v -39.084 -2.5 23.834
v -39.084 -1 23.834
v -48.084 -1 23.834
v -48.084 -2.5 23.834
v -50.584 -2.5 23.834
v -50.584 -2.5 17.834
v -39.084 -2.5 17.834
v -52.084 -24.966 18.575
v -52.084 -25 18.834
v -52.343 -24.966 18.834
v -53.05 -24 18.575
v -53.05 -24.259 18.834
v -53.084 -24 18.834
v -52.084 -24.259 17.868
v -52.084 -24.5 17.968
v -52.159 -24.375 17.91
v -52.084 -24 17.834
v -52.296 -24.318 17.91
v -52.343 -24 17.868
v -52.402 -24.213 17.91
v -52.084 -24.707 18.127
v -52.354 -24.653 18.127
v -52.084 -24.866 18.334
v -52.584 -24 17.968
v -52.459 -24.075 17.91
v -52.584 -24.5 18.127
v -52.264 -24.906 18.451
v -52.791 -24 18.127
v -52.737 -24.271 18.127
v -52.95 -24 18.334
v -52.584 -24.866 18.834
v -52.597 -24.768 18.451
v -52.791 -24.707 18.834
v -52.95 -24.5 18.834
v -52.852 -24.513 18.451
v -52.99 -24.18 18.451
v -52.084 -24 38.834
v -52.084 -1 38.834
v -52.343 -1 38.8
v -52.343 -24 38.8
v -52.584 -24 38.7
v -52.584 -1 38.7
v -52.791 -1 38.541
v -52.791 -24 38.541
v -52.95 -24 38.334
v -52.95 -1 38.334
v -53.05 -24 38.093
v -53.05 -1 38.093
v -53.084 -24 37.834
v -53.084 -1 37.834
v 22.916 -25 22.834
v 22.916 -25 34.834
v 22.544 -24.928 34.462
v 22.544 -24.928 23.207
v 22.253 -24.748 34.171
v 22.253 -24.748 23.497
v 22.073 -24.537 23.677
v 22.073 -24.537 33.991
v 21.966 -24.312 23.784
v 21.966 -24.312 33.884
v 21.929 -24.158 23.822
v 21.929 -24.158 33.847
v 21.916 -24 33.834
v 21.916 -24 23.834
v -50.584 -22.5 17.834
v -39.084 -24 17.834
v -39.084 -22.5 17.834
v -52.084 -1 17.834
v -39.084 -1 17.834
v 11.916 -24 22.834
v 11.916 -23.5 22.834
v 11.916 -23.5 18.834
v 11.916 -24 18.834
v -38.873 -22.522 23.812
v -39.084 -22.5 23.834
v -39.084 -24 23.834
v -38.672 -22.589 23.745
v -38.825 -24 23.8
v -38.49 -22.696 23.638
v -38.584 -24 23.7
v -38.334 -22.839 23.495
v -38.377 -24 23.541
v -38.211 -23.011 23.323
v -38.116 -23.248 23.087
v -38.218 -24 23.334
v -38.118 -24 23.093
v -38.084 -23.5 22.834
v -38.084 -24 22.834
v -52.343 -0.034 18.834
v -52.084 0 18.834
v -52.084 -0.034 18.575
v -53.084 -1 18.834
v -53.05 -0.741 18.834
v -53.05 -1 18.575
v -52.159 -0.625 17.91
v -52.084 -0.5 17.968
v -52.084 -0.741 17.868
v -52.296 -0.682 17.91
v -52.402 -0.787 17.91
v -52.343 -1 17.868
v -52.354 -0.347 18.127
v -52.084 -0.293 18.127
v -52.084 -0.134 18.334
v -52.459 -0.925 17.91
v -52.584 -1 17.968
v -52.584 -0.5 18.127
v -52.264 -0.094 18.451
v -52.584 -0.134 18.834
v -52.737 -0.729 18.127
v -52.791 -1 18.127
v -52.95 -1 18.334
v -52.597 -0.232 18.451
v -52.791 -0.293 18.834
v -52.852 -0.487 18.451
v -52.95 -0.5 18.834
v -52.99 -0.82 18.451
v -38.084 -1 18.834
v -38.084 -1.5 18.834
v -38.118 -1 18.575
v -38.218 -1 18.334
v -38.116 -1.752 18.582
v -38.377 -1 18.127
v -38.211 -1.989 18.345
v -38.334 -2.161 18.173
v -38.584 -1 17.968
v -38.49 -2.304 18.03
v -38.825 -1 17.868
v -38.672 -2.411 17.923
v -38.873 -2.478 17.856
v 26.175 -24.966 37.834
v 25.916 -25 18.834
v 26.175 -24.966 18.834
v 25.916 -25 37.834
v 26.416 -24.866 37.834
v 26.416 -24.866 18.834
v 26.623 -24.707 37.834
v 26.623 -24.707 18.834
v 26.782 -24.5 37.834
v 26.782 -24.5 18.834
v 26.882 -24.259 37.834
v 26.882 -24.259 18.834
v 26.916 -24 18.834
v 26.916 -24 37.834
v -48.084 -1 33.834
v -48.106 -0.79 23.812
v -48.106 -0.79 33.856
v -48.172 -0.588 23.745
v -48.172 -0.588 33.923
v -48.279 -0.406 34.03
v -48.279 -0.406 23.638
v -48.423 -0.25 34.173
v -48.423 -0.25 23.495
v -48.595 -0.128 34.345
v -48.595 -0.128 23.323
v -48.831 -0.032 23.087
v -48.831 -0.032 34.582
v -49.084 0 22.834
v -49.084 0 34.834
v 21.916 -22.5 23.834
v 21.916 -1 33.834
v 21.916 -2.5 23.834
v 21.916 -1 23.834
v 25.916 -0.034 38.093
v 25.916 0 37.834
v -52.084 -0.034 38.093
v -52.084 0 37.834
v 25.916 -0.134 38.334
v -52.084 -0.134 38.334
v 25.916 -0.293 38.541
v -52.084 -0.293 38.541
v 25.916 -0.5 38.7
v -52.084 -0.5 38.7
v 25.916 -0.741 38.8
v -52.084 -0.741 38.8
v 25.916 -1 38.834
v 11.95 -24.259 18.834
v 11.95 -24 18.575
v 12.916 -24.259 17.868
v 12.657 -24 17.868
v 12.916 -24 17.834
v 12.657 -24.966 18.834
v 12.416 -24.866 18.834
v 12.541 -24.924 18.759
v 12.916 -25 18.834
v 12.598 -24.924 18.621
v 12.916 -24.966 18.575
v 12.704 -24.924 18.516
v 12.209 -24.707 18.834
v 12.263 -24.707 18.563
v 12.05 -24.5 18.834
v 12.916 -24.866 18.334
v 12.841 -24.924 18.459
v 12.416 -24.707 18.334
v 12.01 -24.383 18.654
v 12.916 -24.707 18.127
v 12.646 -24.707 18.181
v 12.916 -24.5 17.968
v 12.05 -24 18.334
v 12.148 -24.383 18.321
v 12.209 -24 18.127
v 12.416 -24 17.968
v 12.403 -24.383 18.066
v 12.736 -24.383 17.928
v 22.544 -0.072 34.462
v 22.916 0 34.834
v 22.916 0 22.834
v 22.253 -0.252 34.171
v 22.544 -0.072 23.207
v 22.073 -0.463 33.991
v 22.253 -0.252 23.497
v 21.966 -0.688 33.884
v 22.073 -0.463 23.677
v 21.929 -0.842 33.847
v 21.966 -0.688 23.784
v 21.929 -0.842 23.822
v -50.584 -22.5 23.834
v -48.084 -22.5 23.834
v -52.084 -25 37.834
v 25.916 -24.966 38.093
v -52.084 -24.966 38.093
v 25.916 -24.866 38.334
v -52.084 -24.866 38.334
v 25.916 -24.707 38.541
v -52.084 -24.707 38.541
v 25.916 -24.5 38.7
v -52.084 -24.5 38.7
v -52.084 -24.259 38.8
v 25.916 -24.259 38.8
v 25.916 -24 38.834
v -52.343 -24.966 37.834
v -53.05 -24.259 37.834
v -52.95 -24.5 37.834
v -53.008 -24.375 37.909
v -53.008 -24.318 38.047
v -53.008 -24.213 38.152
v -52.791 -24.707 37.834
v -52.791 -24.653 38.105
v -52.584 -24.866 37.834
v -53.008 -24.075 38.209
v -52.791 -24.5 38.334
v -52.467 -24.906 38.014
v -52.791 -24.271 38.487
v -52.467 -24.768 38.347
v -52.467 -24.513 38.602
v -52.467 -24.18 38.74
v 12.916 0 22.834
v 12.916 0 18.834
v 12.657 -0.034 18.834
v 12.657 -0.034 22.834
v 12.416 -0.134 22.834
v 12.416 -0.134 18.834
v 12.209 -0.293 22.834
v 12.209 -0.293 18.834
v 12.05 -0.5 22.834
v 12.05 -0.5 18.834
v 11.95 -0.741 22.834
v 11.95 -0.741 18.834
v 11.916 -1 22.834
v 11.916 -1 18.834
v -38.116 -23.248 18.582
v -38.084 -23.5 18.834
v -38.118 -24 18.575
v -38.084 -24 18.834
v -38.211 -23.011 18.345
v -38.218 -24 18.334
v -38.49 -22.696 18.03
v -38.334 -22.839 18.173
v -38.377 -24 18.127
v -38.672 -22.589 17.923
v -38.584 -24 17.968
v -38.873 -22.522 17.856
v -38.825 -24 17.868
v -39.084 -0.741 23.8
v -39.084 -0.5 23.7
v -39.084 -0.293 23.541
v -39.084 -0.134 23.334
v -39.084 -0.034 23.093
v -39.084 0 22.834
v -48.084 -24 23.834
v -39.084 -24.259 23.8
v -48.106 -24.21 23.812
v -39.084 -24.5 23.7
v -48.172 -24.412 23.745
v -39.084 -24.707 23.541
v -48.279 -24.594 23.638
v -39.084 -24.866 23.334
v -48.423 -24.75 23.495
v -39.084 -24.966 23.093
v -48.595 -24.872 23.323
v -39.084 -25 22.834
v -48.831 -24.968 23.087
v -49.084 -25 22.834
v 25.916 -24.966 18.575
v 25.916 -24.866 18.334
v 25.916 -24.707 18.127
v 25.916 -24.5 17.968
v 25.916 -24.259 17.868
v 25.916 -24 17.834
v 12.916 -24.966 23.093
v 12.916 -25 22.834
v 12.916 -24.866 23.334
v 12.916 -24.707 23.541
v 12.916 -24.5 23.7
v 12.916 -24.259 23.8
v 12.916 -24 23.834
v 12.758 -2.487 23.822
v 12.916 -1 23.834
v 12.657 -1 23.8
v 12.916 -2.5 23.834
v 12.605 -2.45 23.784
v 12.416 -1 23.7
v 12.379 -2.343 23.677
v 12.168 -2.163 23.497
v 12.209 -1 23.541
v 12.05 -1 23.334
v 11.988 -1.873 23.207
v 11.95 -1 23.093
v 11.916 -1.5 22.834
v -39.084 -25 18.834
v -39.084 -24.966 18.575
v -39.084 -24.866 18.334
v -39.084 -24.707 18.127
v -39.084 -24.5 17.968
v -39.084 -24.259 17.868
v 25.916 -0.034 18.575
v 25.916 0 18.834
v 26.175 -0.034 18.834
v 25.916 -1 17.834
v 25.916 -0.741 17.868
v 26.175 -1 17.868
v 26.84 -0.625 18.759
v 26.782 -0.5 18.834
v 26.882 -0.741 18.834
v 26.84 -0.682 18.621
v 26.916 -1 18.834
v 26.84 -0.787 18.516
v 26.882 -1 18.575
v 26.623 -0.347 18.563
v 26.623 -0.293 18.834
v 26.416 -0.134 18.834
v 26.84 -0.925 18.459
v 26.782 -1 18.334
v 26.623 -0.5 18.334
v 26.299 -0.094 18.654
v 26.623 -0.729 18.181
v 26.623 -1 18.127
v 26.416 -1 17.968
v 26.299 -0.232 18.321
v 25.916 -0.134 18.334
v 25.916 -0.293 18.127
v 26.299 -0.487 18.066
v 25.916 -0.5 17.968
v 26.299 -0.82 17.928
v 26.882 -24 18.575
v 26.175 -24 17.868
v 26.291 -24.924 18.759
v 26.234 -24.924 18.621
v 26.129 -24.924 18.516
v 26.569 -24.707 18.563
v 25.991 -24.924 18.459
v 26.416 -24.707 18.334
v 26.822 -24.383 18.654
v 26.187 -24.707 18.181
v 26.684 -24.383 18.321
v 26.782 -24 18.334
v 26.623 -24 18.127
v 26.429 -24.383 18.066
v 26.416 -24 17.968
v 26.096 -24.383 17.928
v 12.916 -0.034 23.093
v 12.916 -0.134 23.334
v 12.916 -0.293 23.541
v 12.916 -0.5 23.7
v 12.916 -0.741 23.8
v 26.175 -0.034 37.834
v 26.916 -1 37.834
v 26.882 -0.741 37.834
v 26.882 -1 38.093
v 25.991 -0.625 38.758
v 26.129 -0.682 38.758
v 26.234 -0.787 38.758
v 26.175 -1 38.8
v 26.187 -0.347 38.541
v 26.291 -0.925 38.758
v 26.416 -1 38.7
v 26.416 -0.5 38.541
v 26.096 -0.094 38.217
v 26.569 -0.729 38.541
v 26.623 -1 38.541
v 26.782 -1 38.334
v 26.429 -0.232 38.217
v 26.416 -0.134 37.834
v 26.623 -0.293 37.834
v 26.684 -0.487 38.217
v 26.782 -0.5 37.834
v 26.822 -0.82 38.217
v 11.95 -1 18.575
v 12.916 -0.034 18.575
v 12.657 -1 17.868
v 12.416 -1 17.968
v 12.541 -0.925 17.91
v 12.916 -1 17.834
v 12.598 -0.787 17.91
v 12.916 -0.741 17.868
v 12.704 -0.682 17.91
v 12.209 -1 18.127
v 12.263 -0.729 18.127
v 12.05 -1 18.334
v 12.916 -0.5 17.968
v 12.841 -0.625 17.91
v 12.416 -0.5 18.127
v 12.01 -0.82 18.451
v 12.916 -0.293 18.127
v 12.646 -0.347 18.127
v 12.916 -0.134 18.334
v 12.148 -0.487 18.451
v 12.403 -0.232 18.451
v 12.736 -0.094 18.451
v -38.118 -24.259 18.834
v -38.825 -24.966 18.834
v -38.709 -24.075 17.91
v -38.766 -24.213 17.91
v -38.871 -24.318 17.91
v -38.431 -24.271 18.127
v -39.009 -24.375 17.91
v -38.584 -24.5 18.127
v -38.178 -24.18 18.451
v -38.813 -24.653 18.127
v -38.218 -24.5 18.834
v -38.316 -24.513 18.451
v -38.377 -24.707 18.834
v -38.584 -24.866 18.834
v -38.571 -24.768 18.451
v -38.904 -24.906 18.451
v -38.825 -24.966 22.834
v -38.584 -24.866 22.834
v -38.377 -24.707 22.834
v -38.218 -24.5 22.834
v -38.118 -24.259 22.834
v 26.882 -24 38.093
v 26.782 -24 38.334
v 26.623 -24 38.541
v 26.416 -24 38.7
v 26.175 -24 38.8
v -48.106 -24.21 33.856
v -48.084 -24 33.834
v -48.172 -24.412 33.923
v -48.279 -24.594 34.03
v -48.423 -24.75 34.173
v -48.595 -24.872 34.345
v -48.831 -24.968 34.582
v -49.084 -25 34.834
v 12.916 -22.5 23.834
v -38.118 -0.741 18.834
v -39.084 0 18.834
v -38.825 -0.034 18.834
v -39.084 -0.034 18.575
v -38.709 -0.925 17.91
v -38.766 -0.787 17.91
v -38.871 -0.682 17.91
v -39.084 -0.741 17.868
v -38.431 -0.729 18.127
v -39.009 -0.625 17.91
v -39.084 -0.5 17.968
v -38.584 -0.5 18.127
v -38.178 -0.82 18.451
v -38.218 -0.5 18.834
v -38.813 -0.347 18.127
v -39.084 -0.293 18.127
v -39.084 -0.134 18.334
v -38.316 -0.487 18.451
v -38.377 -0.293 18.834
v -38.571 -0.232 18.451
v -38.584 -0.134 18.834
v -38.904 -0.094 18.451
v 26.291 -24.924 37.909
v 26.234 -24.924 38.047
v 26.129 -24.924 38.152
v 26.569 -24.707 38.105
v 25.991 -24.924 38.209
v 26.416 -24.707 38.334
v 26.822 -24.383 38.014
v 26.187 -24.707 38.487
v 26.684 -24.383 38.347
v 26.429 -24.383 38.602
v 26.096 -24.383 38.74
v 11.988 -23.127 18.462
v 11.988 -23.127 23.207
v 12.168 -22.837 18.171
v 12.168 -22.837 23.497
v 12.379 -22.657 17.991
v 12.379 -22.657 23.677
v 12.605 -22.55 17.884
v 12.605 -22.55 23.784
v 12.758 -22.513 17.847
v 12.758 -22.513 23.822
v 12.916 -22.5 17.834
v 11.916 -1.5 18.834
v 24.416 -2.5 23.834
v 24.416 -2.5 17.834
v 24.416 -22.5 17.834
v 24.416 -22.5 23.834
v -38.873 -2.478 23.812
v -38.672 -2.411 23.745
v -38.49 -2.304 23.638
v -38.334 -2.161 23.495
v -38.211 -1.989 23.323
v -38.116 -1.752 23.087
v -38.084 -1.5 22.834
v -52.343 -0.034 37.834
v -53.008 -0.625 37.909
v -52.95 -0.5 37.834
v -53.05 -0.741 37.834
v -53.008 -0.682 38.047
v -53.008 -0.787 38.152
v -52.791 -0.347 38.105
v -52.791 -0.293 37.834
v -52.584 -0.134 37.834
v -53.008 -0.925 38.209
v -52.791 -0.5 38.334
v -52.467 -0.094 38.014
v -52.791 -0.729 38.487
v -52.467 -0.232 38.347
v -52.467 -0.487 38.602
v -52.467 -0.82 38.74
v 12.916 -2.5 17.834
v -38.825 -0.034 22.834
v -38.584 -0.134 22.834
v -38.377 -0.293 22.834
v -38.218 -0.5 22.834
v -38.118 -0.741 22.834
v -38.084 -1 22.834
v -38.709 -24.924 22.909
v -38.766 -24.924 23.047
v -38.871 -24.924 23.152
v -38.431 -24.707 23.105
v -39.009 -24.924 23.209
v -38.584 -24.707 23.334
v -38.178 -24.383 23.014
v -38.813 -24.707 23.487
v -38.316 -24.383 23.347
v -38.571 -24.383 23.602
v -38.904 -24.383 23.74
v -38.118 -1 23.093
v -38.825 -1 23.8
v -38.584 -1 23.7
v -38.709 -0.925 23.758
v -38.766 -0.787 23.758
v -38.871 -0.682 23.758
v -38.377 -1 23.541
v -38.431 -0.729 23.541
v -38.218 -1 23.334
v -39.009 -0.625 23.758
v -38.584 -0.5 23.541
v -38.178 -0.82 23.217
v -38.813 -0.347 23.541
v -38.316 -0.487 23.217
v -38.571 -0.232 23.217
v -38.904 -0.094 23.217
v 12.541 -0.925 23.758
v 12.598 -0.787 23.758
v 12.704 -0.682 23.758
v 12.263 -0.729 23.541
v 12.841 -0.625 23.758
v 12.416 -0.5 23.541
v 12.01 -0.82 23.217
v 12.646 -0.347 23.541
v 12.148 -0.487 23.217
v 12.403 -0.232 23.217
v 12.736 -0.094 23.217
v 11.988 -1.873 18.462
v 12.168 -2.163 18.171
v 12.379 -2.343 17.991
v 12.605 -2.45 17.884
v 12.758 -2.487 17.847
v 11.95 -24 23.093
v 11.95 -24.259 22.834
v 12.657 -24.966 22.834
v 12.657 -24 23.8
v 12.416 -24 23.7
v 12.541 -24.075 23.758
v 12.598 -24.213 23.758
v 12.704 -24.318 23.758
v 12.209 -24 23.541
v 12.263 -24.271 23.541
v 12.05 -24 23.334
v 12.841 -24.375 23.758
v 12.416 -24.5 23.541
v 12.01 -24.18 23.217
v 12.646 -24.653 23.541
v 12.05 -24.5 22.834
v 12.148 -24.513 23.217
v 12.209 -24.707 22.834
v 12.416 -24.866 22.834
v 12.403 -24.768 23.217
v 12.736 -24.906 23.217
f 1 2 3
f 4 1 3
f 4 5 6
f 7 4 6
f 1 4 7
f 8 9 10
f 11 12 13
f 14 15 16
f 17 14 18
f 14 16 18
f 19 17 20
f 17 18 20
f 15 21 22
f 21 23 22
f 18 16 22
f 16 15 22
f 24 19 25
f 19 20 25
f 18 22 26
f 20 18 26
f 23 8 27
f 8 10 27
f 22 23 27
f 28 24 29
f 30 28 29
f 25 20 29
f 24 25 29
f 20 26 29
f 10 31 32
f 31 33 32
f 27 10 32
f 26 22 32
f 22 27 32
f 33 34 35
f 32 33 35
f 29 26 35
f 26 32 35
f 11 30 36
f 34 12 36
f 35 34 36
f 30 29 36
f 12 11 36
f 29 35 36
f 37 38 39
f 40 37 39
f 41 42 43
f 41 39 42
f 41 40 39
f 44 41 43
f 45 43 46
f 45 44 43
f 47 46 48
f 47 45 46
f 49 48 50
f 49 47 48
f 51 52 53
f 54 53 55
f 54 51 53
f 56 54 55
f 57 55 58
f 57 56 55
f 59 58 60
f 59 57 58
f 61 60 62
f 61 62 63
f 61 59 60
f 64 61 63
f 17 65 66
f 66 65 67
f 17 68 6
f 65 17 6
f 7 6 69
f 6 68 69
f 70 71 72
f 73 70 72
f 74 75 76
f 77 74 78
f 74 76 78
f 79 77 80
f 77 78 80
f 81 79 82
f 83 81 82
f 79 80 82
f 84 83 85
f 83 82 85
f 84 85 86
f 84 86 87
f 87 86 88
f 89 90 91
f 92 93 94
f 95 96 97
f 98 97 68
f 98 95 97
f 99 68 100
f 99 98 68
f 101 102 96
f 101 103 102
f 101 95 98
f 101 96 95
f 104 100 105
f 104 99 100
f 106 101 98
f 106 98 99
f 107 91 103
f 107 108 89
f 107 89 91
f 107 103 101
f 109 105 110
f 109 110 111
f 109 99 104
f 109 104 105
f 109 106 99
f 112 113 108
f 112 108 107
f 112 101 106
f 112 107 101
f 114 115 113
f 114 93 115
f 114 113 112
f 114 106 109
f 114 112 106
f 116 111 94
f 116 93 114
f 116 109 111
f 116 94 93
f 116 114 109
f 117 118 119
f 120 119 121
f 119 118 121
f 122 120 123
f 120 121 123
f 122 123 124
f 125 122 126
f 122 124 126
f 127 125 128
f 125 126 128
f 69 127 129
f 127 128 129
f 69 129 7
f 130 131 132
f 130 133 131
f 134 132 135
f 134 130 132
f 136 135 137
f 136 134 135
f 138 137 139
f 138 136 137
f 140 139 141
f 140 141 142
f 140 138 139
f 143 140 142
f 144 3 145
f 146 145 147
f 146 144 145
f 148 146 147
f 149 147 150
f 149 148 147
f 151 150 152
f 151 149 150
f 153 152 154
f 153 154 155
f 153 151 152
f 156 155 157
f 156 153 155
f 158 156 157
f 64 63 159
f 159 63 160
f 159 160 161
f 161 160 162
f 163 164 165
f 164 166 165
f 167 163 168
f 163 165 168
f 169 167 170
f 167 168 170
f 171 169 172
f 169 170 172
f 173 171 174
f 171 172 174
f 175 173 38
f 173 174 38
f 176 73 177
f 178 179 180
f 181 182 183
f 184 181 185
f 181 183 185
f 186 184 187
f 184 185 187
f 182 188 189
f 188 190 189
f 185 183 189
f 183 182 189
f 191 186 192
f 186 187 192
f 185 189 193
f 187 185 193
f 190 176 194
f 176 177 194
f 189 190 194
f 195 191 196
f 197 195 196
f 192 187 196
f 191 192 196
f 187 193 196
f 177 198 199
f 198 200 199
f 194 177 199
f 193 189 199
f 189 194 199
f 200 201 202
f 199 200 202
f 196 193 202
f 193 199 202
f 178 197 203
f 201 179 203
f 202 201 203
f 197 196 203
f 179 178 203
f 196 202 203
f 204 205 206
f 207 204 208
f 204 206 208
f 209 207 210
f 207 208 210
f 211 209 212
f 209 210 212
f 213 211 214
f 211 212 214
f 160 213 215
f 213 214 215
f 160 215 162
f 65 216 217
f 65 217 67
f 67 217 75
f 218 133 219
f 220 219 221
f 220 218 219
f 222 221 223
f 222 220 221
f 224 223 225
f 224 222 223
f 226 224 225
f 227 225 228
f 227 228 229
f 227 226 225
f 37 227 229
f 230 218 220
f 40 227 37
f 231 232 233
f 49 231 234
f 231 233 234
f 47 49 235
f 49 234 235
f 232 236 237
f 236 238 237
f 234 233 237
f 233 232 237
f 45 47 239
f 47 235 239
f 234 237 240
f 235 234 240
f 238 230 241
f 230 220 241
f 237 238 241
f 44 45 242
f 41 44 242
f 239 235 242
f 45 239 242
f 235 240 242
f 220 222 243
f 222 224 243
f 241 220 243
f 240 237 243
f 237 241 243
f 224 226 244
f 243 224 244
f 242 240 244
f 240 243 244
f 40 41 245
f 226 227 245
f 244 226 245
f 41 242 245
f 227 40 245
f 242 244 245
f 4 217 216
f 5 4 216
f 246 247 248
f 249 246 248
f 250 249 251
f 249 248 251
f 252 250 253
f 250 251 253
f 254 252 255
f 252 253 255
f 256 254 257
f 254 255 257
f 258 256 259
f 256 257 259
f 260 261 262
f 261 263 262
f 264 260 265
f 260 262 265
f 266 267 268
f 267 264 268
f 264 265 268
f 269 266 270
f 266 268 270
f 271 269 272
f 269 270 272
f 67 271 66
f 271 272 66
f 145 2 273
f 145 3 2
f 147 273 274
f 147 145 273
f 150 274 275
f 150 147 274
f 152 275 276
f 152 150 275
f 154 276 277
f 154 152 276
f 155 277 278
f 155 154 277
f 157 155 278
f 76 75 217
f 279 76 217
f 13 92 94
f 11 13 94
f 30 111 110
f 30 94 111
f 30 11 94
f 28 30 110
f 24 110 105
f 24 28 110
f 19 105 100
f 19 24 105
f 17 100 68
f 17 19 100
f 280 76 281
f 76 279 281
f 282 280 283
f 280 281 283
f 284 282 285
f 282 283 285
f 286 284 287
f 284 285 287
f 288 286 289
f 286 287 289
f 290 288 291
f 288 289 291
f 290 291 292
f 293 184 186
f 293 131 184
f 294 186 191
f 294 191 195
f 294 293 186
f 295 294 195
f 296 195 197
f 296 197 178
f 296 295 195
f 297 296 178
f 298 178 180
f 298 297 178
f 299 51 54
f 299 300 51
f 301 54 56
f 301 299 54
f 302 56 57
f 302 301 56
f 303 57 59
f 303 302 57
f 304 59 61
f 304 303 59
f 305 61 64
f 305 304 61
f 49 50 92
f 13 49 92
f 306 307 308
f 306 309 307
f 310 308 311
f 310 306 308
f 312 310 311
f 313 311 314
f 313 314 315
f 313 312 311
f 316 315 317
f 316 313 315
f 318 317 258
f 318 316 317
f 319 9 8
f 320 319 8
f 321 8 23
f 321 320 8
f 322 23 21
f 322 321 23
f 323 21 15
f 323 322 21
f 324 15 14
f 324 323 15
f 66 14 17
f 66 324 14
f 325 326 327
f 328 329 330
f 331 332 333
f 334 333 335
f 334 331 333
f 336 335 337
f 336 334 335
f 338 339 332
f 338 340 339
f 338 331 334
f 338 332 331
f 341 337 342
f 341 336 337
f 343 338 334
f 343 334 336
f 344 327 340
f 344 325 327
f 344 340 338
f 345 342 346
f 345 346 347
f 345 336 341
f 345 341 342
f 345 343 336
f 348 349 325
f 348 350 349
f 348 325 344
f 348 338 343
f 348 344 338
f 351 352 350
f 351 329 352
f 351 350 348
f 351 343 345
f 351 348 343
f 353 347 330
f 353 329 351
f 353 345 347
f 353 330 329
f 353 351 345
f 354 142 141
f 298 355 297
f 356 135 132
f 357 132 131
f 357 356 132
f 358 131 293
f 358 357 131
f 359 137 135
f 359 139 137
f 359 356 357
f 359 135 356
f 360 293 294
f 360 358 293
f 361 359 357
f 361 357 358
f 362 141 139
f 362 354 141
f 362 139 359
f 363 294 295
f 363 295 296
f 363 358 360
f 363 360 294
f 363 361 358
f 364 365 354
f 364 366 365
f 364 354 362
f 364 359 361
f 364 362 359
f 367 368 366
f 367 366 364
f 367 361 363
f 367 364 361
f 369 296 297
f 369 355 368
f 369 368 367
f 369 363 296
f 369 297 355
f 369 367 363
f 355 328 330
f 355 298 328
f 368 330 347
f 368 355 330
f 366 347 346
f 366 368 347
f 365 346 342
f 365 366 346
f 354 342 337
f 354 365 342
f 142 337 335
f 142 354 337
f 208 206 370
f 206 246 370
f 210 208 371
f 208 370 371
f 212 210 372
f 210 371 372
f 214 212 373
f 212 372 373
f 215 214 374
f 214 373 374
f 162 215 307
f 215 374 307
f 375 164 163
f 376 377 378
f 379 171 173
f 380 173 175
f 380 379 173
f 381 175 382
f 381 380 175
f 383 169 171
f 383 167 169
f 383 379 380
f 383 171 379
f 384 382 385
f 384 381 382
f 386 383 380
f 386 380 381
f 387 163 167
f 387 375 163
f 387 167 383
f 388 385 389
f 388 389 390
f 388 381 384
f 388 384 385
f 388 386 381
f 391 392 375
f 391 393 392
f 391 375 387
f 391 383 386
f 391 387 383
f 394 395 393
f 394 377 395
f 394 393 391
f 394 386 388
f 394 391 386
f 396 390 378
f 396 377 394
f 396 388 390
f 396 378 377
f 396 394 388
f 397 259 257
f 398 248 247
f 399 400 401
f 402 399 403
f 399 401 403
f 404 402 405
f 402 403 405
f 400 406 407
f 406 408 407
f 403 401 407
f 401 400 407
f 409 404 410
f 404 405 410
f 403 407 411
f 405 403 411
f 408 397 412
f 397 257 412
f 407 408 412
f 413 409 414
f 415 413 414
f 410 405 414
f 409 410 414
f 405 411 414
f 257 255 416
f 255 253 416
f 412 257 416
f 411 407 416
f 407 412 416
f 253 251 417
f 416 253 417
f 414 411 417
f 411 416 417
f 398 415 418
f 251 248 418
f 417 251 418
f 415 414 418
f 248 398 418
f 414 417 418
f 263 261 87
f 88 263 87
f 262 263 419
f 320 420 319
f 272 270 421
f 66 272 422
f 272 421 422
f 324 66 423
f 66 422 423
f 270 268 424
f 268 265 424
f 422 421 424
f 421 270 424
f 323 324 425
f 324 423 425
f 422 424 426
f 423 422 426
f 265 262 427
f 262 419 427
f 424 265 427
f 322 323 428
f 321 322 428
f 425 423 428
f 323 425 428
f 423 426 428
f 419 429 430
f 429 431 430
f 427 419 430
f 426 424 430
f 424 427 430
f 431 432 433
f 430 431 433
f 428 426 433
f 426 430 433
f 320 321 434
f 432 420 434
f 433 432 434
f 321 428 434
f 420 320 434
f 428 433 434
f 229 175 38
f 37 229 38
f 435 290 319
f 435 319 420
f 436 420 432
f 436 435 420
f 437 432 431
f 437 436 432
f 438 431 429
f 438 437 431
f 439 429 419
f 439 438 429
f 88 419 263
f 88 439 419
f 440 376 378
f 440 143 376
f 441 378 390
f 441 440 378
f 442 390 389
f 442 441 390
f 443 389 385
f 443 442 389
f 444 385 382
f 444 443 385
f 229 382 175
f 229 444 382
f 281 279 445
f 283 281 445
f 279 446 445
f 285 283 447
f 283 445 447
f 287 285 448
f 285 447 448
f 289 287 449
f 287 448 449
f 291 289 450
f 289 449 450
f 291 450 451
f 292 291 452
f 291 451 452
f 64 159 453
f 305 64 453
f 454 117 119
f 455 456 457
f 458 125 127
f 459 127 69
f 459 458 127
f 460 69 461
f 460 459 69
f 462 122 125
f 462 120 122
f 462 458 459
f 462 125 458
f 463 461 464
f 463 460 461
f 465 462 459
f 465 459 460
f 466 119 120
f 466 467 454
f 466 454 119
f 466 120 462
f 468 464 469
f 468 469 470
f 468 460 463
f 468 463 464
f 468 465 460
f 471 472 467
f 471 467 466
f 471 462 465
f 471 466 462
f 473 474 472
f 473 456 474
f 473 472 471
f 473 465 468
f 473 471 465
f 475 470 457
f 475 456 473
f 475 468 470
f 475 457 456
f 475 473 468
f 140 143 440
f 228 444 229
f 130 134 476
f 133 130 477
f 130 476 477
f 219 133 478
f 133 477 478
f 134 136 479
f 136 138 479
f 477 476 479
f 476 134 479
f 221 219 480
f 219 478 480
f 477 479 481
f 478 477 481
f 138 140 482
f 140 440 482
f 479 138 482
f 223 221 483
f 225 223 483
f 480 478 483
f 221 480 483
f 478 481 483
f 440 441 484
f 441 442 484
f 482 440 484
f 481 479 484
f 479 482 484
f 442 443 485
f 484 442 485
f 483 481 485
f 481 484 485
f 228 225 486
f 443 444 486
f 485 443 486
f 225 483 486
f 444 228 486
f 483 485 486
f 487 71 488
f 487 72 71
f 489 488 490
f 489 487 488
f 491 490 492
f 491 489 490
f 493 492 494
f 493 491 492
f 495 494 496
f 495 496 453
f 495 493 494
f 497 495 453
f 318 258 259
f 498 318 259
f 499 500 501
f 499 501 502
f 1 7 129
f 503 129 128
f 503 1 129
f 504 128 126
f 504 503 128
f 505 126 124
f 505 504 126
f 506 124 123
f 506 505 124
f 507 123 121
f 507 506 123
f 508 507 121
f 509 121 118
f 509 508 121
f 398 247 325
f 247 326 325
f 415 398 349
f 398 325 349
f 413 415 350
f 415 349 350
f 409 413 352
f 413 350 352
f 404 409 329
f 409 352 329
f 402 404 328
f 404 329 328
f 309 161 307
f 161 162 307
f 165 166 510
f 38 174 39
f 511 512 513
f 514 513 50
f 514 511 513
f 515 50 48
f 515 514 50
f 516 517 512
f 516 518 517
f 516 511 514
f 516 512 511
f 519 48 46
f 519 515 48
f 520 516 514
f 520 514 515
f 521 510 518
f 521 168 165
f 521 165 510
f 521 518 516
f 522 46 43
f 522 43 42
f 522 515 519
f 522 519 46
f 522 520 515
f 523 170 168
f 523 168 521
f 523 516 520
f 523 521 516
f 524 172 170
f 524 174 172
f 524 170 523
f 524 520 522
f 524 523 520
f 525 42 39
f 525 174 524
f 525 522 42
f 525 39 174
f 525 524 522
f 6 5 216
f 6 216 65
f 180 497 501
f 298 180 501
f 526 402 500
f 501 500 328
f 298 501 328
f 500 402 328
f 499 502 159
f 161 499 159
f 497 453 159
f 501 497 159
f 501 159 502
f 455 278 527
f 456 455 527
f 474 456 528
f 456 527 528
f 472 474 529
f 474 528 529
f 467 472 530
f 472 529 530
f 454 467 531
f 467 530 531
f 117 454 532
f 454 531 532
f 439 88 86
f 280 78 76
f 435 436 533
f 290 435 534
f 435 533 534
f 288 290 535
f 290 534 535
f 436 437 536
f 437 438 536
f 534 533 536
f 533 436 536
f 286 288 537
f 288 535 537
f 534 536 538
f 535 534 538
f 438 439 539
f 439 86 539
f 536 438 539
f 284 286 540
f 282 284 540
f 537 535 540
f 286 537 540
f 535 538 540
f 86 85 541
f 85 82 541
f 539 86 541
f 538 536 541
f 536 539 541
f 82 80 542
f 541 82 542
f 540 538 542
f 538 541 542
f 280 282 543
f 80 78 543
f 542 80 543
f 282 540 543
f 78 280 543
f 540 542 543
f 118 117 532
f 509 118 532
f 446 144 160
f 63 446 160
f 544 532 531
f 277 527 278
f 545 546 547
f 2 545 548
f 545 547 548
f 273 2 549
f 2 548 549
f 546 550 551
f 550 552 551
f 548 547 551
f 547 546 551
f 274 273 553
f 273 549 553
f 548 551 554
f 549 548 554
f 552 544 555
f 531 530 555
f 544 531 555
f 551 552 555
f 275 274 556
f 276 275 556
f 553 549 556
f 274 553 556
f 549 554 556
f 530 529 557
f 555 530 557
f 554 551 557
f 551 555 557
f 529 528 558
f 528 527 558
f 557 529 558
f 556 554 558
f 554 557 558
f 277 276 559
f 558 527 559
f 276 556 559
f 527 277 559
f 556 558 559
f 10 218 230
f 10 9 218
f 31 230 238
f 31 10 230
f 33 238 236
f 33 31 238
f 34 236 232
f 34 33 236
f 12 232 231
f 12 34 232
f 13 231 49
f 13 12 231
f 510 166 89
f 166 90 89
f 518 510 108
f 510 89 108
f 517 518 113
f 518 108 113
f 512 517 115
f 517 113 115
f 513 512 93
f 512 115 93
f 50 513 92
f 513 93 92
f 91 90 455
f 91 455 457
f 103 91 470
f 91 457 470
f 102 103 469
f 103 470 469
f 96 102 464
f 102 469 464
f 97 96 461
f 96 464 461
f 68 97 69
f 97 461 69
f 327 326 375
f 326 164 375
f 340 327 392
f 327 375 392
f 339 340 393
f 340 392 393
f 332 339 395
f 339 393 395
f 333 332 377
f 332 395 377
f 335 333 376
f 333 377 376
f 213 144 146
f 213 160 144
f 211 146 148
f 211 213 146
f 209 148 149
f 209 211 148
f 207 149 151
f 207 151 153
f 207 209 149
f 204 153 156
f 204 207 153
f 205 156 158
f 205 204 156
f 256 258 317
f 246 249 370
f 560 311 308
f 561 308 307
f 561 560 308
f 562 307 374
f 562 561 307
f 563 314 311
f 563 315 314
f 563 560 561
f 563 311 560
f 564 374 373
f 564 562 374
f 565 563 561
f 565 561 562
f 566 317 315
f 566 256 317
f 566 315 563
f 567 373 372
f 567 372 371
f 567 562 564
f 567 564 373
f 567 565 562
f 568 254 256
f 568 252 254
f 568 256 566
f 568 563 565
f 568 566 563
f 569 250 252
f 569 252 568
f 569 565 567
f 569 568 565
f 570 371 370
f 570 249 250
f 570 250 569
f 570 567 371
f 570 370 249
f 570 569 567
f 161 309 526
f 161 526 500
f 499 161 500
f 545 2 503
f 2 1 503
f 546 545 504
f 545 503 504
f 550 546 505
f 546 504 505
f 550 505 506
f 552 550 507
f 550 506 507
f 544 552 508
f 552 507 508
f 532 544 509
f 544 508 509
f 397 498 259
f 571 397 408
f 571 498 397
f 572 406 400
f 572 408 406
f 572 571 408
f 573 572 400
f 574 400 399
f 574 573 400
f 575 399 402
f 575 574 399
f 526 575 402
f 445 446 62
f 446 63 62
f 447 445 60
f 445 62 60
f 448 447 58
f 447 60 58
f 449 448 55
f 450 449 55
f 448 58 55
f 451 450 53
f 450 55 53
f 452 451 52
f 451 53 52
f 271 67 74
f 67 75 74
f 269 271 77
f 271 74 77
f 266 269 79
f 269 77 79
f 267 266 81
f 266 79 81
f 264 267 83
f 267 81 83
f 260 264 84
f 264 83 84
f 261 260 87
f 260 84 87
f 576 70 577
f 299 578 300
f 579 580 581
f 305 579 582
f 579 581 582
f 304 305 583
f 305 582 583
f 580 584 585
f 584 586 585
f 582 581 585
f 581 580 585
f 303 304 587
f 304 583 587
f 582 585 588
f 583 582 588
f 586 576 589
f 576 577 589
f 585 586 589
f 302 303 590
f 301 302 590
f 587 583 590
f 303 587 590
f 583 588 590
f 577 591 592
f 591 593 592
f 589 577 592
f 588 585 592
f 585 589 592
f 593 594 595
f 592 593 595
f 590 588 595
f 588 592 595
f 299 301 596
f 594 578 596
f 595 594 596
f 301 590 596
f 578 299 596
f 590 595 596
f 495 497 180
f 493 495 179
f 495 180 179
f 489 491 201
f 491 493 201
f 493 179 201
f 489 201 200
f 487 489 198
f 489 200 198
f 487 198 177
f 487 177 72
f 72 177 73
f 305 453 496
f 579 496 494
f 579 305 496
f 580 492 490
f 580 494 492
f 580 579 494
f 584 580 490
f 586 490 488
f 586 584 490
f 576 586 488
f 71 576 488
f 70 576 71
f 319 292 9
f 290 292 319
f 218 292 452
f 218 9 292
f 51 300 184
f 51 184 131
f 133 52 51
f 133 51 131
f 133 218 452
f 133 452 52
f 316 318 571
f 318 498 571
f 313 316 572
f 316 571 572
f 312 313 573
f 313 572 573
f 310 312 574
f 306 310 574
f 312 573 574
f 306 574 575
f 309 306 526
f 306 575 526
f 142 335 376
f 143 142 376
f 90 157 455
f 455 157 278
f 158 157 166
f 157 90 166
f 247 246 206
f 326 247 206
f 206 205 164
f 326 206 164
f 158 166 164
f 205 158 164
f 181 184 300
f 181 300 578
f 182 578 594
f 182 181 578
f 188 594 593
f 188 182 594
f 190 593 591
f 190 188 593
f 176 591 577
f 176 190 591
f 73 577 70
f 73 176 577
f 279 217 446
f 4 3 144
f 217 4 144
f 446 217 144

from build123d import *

# Parameters (mm, degrees)
F1_DEPTH    = 25
F2_T        = 2.5
F2_T3_DEPTH = 30
F3_R        = 1


# Not quite as in the source:
# - a shell that OpenCascade refuses in one call is made with other operations: the cavity is built on its own and cut out


with BuildPart() as f1:
    # F0 (on Front) → F1 (new body)
    with BuildSketch(Plane.XZ):
        Polygon((-48.0838582665, 23.83404883), (-48.0838582665, 33.83404883), (21.9161417335, 33.83404883), (21.9161417335, 23.83404883), (11.9161417335, 23.83404883), (11.9161417335, 17.83404883), (21.9161417335, 17.83404883), (26.9161417335, 17.83404883), (26.9161417335, 38.83404883), (-53.0838582665, 38.83404883), (-53.0838582665, 17.83404883), (-48.0838582665, 17.83404883), (-38.0838582665, 17.83404883), (-38.0838582665, 23.83404883), align=None)
    extrude(amount=F1_DEPTH)

    # F2: shell of thickness 2.5, made by hand


with BuildPart() as f2_core1:
    # F2_t2: copy of F1
    add(f1.part)

    # the walls: a layer under each face that stays
    f2_faces = [f2_core1.faces().sort_by_distance(p)[0] for p in [
        (21.9161417335, -12.5, 28.83404883),
        (-39.7505249331, -25, 21.33404883),
        (-48.0838582665, -12.5, 28.83404883),
        (-53.0838582665, -12.5, 28.33404883),
        (-13.0838582665, -12.5, 38.83404883),
        (26.9161417335, -12.5, 28.33404883),
        (-39.7505249331, 0, 21.33404883),
        (-13.0838582665, -12.5, 33.83404883),
    ]]
    thicken(f2_faces, amount=-F2_T, mode=Mode.SUBTRACT)

    # F2_s4 → F2_t3 (cut)
    with BuildSketch(Plane.XZ.offset(-2.5)):
        Polygon((21.8911417335, 33.80904883), (24.4161417335, 33.83404883), (24.4161417335, 36.33404883), (21.9161417335, 36.33404883), align=None)
        Polygon((-48.0588582665, 33.80904883), (-50.5838582665, 33.83404883), (-50.5838582665, 36.33404883), (-48.0838582665, 36.33404883), align=None)
    extrude(amount=F2_T3_DEPTH, mode=Mode.SUBTRACT)


with BuildPart() as f1_1:
    add(f1.part)

    # what is left inside the walls is the cavity
    f2_cavity = [f2_core1.part.solids().sort_by_distance(p)[0] for p in [
        (18.166142, -15.833333, 23.809049),
        (-44.333858, -15.833333, 23.809049),
    ]]
    add(f2_cavity, mode=Mode.SUBTRACT)

    # F3
    f3_edges = [f1_1.edges().sort_by_distance(p)[0] for p in [
        (-38.083858, 0, 20.834049),
        (-38.083858, -1.25, 23.834049),
        (-38.083858, -2.5, 20.834049),
        (-38.083858, -1.25, 17.834049),
        (-38.083858, -22.5, 20.834049),
        (-38.083858, -23.75, 23.834049),
        (-38.083858, -25, 20.834049),
        (-38.083858, -23.75, 17.834049),
        (11.916142, 0, 20.834049),
        (11.916142, -1.25, 17.834049),
        (11.916142, -2.5, 20.834049),
        (11.916142, -1.25, 23.834049),
        (11.916142, -22.5, 20.834049),
        (11.916142, -23.75, 17.834049),
        (11.916142, -25, 20.834049),
        (11.916142, -23.75, 23.834049),
        (21.916142, 0, 28.834049),
        (16.916142, 0, 23.834049),
        (19.416142, 0, 17.834049),
        (26.916142, 0, 28.334049),
        (-13.083858, 0, 38.834049),
        (-53.083858, 0, 28.334049),
        (-45.583858, 0, 17.834049),
        (-43.083858, 0, 23.834049),
        (-48.083858, 0, 28.834049),
        (-13.083858, 0, 33.834049),
        (26.916142, -12.5, 17.834049),
        (26.916142, -12.5, 38.834049),
        (26.916142, -25, 28.334049),
        (21.916142, -25, 28.834049),
        (16.916142, -25, 23.834049),
        (19.416142, -25, 17.834049),
        (-13.083858, -25, 38.834049),
        (-53.083858, -25, 28.334049),
        (-45.583858, -25, 17.834049),
        (-43.083858, -25, 23.834049),
        (-48.083858, -25, 28.834049),
        (-13.083858, -25, 33.834049),
        (-53.083858, -12.5, 38.834049),
        (-53.083858, -12.5, 17.834049),
    ]]
    fillet(f3_edges, radius=F3_R)


solid = f1_1.part
